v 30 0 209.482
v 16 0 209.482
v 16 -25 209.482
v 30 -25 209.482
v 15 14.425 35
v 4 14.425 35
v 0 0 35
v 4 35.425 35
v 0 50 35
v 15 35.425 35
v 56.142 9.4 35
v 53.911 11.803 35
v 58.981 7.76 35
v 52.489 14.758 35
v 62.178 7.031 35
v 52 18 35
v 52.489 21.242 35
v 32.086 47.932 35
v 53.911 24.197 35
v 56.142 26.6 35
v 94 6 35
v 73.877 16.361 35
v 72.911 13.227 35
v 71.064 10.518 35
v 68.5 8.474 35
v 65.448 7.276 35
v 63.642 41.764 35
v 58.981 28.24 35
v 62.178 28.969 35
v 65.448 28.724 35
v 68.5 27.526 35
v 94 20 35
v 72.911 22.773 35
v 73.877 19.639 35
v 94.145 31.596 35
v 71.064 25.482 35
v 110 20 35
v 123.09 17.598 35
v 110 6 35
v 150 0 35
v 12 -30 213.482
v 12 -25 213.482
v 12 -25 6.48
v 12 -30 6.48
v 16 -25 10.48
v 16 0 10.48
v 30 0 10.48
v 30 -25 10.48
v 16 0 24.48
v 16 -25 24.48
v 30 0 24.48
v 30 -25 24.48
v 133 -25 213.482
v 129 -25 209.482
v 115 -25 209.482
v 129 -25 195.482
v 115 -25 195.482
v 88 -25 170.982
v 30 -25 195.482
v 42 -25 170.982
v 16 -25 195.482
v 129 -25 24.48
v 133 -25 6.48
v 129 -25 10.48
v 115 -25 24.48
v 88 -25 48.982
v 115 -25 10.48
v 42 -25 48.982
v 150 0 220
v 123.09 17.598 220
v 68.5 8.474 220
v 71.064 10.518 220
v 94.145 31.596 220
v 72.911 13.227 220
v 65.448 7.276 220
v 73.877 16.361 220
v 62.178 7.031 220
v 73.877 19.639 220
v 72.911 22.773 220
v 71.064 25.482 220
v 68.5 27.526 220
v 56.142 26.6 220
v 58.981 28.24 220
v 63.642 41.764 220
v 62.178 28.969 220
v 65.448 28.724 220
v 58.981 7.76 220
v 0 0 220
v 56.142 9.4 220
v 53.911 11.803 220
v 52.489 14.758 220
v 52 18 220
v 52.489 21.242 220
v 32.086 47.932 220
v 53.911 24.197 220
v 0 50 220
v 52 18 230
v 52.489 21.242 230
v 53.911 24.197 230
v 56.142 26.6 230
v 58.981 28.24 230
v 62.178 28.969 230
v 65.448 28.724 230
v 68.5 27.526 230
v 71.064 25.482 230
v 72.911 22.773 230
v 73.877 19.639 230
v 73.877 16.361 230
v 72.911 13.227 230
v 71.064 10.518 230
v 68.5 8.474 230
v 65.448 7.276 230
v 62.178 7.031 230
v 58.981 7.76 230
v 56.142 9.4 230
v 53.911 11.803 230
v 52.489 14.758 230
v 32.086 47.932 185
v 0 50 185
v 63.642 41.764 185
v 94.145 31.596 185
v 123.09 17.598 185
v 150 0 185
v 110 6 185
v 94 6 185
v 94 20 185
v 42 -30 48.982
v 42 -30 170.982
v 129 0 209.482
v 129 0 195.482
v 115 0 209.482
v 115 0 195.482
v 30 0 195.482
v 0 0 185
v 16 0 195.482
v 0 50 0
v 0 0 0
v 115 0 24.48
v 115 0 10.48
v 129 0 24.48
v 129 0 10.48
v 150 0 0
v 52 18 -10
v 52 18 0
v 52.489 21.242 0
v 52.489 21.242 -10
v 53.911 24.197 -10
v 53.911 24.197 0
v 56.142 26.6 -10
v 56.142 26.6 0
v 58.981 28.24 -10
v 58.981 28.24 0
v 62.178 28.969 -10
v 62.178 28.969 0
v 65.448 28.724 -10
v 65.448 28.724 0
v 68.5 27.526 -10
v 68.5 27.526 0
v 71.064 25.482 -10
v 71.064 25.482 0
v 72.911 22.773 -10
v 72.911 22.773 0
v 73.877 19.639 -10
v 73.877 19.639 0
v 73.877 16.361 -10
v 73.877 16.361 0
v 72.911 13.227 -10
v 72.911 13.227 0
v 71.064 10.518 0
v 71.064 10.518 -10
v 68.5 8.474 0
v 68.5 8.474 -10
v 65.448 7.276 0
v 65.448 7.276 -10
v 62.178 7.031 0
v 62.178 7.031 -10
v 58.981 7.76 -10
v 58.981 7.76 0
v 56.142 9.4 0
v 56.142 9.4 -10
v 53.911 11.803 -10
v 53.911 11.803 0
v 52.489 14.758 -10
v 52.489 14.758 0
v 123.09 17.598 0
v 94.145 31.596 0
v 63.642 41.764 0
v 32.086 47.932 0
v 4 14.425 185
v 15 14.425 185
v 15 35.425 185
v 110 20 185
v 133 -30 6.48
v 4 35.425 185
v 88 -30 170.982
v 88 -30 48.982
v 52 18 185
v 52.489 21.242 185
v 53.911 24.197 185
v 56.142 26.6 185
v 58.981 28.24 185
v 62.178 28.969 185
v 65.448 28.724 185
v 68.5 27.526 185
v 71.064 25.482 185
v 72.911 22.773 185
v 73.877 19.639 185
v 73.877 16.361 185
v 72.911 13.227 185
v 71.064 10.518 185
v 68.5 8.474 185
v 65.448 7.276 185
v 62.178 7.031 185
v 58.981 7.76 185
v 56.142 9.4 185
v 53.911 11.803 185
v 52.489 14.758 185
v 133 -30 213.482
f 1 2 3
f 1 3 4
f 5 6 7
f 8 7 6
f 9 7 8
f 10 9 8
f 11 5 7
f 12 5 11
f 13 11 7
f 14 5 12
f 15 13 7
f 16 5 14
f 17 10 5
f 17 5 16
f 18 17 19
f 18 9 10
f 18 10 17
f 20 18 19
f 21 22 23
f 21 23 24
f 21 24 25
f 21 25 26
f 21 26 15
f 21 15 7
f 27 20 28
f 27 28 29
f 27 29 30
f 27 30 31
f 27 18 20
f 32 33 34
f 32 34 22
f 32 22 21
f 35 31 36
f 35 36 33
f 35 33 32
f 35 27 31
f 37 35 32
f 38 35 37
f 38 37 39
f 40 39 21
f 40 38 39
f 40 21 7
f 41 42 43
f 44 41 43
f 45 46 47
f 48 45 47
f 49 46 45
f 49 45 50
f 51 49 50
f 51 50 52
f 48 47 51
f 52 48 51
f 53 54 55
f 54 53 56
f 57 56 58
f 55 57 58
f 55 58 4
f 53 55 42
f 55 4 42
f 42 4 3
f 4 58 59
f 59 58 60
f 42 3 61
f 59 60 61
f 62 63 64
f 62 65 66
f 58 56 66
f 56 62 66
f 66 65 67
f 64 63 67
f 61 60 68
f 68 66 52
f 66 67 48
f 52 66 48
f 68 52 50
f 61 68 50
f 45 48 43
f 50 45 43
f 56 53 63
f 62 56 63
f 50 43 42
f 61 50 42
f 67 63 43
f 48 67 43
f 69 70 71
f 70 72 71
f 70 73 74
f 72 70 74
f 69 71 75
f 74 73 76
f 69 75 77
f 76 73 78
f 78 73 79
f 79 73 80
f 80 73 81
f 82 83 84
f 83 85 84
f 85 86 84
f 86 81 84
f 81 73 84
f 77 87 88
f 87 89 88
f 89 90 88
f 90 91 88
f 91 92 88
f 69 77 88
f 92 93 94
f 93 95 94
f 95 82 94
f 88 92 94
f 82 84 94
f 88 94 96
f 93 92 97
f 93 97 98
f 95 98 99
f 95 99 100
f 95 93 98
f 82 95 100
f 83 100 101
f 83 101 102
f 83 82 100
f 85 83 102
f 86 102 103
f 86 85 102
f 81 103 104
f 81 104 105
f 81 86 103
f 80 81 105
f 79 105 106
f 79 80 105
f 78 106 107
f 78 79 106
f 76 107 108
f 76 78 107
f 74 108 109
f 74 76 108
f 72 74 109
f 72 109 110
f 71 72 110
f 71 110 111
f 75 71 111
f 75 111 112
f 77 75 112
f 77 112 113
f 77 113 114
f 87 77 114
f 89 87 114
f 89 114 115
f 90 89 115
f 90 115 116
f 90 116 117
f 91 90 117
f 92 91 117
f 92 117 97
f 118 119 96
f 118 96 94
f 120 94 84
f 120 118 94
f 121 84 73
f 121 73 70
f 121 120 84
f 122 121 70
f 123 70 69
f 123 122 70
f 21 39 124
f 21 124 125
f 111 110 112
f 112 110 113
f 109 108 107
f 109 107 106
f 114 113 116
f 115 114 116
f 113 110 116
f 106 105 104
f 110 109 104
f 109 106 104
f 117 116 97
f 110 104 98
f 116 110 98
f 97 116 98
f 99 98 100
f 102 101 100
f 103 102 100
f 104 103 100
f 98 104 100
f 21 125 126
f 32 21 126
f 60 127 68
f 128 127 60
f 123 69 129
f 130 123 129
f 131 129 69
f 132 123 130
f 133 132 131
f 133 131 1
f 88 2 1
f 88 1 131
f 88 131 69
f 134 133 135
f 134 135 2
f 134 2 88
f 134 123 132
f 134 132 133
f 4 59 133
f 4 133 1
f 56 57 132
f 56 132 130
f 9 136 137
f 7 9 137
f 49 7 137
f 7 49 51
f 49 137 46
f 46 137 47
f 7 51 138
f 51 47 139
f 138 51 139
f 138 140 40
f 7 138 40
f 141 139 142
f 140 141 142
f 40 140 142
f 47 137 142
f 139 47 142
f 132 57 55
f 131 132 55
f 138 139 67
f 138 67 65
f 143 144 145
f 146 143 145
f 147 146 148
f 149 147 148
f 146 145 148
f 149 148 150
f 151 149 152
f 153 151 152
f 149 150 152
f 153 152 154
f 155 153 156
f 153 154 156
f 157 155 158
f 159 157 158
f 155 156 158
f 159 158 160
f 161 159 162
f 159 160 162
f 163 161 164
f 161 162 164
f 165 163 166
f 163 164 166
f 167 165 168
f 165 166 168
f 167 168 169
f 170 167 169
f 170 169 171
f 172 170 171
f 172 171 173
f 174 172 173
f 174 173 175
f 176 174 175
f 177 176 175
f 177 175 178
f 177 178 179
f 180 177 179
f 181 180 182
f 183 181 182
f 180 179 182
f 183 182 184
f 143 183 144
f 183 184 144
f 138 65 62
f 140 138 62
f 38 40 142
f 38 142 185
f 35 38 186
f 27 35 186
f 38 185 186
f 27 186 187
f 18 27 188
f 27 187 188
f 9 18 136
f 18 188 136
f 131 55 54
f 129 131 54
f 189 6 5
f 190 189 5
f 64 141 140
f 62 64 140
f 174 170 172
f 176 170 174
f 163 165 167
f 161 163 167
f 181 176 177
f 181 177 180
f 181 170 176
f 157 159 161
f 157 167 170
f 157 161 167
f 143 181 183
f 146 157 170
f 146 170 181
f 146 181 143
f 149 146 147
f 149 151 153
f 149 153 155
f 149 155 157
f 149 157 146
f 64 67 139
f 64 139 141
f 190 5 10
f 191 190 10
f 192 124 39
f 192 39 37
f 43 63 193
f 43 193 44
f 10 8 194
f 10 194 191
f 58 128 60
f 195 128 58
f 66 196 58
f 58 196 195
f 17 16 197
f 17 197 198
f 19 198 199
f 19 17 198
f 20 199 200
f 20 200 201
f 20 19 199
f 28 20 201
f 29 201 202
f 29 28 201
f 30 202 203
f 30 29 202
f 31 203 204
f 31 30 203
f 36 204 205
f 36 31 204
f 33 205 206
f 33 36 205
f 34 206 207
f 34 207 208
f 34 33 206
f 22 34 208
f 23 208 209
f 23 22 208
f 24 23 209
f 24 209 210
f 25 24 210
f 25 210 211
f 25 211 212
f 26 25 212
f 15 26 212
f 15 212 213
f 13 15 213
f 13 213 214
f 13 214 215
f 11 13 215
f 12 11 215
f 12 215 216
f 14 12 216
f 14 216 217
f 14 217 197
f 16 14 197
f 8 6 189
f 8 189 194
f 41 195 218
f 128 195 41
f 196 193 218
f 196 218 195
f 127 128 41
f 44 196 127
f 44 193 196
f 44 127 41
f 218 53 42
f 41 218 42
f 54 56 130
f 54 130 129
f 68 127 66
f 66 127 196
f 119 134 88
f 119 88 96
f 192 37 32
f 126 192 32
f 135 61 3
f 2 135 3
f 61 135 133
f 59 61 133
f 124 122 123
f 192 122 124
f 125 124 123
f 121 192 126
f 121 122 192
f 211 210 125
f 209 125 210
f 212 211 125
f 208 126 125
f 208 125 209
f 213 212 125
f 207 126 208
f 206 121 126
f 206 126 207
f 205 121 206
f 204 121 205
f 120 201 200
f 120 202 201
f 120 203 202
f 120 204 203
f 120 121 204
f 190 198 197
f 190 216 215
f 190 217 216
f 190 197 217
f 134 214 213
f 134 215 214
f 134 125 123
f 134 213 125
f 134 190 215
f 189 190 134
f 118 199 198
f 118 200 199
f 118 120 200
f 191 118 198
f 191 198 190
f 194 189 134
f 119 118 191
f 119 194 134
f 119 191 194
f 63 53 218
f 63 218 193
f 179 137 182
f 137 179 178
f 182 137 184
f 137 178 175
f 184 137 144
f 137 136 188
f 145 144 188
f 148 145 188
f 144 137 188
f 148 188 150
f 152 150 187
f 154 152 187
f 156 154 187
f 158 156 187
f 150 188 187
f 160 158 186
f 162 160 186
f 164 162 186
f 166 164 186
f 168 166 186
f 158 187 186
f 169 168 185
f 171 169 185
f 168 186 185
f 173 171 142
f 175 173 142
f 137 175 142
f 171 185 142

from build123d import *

# Parameters (mm, degrees)
BOSS_EXTRUDE1_DEPTH      = 35
SKETCH2_W                = 11
SKETCH2_H                = 21
BOSS_EXTRUDE3_DEPTH      = 150
BOSS_EXTRUDE4_DEPTH      = 35
SKETCH4_W                = 16
SKETCH4_H                = 14
BOSS_EXTRUDE5_DEPTH      = 150
SKETCH5_W                = 14
SKETCH5_H                = 14
BOSS_EXTRUDE6_DEPTH      = 25
SKETCH6_W                = 121
SKETCH6_H                = 207.00216397
BOSS_EXTRUDE7_DEPTH      = 5
SKETCH7_R                = 11
BOSS_EXTRUDE8_DEPTH      = 10
BOSS_EXTRUDE8_DEPTH_BACK = 230
SKETCH8_W                = 46
SKETCH8_H                = 122
CUT_EXTRUDE1_DEPTH       = 5


with BuildPart() as part:
    # Sketch1 → Boss-Extrude1 (new body)
    with BuildSketch(Plane.XY):
        with BuildLine():
            Line((0, 0), (150, 0))
            ThreePointArc((150, 0), (79.056941504, 37.170824513), (0, 50))
            Line((0, 50), (0, 0))
        make_face()
    extrude(amount=BOSS_EXTRUDE1_DEPTH)

    # Sketch2 → Boss-Extrude3 (add)
    with BuildSketch(Plane.XY.offset(35)):
        with Locations((9.5, 24.924601572)):
            Rectangle(SKETCH2_W, SKETCH2_H)
    extrude(amount=BOSS_EXTRUDE3_DEPTH)

    # Sketch3 → Boss-Extrude4 (add)
    with BuildSketch(Plane.XY.offset(185)):
        with BuildLine():
            Line((150, 0), (0, 0))
            Line((0, 0), (0, 50))
            ThreePointArc((0, 50), (79.056941504, 37.170824513), (150, 0))
        make_face()
    extrude(amount=BOSS_EXTRUDE4_DEPTH)

    # Sketch4 → Boss-Extrude5 (add)
    with BuildSketch(Plane(origin=(0, 0, 185), x_dir=(-1, 0, 0), z_dir=(0, 0, -1))):
        with Locations((-102, 13)):
            Rectangle(SKETCH4_W, SKETCH4_H)
    extrude(amount=BOSS_EXTRUDE5_DEPTH)

    # Sketch5 → Boss-Extrude6 (add)
    with BuildSketch(Plane.XZ):
        with Locations((23, 202.48216397)):
            Rectangle(SKETCH5_W, SKETCH5_H)
        with Locations((23, 17.48)):
            Rectangle(SKETCH5_W, SKETCH5_H)
        with Locations((122, 202.48216397)):
            Rectangle(SKETCH5_W, SKETCH5_H)
        with Locations((122, 17.48)):
            Rectangle(SKETCH5_W, SKETCH5_H)
    extrude(amount=BOSS_EXTRUDE6_DEPTH)

    # Sketch6 → Boss-Extrude7 (add)
    with BuildSketch(Plane(origin=(0, -25, 0), x_dir=(-1, 0, 0), z_dir=(0, -1, 0))):
        with Locations((-72.5, -109.981081985)):
            Rectangle(SKETCH6_W, SKETCH6_H)
    extrude(amount=BOSS_EXTRUDE7_DEPTH)

    # Sketch7 → Boss-Extrude8 (add, two sides)
    with BuildSketch(Plane(origin=(0, 0, 0), x_dir=(-1, 0, 0), z_dir=(0, 0, -1))) as boss_extrude8_sk:
        with Locations((-63, 18)):
            Circle(SKETCH7_R)
    extrude(amount=BOSS_EXTRUDE8_DEPTH)
    extrude(boss_extrude8_sk.sketch, amount=-BOSS_EXTRUDE8_DEPTH_BACK)

    # Sketch8 → Cut-Extrude1 (cut)
    with BuildSketch(Plane.XZ.offset(30)):
        with Locations((65, 109.98216397)):
            Rectangle(SKETCH8_W, SKETCH8_H)
    extrude(amount=-CUT_EXTRUDE1_DEPTH, mode=Mode.SUBTRACT)


solid = part.part
